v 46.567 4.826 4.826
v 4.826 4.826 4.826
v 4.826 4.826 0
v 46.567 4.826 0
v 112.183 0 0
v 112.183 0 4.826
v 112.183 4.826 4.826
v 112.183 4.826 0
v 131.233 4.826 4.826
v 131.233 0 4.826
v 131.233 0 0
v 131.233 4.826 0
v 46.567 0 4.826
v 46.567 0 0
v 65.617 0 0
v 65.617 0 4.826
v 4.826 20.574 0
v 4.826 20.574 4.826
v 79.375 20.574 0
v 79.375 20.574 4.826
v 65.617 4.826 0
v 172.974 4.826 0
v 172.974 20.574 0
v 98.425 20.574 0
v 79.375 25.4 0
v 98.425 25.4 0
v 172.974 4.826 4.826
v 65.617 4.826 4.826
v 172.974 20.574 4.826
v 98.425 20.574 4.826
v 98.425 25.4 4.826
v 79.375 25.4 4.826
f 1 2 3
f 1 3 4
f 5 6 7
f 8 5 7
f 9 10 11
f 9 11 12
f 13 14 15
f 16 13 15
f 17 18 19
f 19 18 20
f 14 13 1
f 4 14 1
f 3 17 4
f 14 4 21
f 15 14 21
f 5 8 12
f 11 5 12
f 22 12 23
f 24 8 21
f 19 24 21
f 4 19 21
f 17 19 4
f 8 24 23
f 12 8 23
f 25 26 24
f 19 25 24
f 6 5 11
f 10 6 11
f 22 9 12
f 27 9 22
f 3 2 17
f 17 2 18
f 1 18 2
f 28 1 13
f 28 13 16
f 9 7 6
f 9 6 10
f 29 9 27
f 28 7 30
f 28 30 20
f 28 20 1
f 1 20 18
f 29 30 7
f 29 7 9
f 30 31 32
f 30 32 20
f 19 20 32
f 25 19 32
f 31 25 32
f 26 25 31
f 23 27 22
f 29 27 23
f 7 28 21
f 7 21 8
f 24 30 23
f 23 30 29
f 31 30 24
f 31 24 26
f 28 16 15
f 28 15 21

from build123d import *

# Parameters (mm, degrees)
SKETCH1_W               = 177.8
SKETCH1_H               = 25.4
BOSS_EXTRUDE1_DEPTH     = 4.826
SKETCH2_W               = 46.566666667
SKETCH2_H               = 4.826
SKETCH2_W_2             = 46.566666666
BOTTOM_EDGE_SLOTS_DEPTH = 180.669948172
SKETCH3_W               = 79.375
SKETCH3_H               = 4.826
TOP_EDGE_SLOTS_DEPTH    = 180.669948172
SKETCH4_W               = 4.826
SKETCH4_H               = 15.748
EDGE_CUTS_DEPTH         = 180.669948172


with BuildPart() as part:
    # Sketch1 → Boss-Extrude1 (new body)
    with BuildSketch(Plane.XY):
        with Locations((88.9, 12.7)):
            Rectangle(SKETCH1_W, SKETCH1_H)
    extrude(amount=BOSS_EXTRUDE1_DEPTH)

    # Sketch2 → Bottom Edge Slots (cut, through all)
    with BuildSketch(Plane.XY.offset(4.826)):
        with Locations((23.283333333, 2.413)):
            Rectangle(SKETCH2_W, SKETCH2_H)
        with Locations((88.9, 2.413)):
            Rectangle(SKETCH2_W_2, SKETCH2_H)
        with Locations((154.516666667, 2.413)):
            Rectangle(SKETCH2_W, SKETCH2_H)
    extrude(amount=-BOTTOM_EDGE_SLOTS_DEPTH, mode=Mode.SUBTRACT)

    # Sketch3 → Top Edge Slots (cut, through all)
    with BuildSketch(Plane.XY.offset(4.826)):
        with Locations((39.6875, 22.987)):
            Rectangle(SKETCH3_W, SKETCH3_H)
        with Locations((138.1125, 22.987)):
            Rectangle(SKETCH3_W, SKETCH3_H)
    extrude(amount=-TOP_EDGE_SLOTS_DEPTH, mode=Mode.SUBTRACT)

    # Sketch4 → Edge Cuts (cut, through all)
    with BuildSketch(Plane.XY.offset(4.826)):
        with Locations((2.413, 12.7)):
            Rectangle(SKETCH4_W, SKETCH4_H)
        with Locations((175.387, 12.7)):
            Rectangle(SKETCH4_W, SKETCH4_H)
    extrude(amount=-EDGE_CUTS_DEPTH, mode=Mode.SUBTRACT)


solid = part.part
